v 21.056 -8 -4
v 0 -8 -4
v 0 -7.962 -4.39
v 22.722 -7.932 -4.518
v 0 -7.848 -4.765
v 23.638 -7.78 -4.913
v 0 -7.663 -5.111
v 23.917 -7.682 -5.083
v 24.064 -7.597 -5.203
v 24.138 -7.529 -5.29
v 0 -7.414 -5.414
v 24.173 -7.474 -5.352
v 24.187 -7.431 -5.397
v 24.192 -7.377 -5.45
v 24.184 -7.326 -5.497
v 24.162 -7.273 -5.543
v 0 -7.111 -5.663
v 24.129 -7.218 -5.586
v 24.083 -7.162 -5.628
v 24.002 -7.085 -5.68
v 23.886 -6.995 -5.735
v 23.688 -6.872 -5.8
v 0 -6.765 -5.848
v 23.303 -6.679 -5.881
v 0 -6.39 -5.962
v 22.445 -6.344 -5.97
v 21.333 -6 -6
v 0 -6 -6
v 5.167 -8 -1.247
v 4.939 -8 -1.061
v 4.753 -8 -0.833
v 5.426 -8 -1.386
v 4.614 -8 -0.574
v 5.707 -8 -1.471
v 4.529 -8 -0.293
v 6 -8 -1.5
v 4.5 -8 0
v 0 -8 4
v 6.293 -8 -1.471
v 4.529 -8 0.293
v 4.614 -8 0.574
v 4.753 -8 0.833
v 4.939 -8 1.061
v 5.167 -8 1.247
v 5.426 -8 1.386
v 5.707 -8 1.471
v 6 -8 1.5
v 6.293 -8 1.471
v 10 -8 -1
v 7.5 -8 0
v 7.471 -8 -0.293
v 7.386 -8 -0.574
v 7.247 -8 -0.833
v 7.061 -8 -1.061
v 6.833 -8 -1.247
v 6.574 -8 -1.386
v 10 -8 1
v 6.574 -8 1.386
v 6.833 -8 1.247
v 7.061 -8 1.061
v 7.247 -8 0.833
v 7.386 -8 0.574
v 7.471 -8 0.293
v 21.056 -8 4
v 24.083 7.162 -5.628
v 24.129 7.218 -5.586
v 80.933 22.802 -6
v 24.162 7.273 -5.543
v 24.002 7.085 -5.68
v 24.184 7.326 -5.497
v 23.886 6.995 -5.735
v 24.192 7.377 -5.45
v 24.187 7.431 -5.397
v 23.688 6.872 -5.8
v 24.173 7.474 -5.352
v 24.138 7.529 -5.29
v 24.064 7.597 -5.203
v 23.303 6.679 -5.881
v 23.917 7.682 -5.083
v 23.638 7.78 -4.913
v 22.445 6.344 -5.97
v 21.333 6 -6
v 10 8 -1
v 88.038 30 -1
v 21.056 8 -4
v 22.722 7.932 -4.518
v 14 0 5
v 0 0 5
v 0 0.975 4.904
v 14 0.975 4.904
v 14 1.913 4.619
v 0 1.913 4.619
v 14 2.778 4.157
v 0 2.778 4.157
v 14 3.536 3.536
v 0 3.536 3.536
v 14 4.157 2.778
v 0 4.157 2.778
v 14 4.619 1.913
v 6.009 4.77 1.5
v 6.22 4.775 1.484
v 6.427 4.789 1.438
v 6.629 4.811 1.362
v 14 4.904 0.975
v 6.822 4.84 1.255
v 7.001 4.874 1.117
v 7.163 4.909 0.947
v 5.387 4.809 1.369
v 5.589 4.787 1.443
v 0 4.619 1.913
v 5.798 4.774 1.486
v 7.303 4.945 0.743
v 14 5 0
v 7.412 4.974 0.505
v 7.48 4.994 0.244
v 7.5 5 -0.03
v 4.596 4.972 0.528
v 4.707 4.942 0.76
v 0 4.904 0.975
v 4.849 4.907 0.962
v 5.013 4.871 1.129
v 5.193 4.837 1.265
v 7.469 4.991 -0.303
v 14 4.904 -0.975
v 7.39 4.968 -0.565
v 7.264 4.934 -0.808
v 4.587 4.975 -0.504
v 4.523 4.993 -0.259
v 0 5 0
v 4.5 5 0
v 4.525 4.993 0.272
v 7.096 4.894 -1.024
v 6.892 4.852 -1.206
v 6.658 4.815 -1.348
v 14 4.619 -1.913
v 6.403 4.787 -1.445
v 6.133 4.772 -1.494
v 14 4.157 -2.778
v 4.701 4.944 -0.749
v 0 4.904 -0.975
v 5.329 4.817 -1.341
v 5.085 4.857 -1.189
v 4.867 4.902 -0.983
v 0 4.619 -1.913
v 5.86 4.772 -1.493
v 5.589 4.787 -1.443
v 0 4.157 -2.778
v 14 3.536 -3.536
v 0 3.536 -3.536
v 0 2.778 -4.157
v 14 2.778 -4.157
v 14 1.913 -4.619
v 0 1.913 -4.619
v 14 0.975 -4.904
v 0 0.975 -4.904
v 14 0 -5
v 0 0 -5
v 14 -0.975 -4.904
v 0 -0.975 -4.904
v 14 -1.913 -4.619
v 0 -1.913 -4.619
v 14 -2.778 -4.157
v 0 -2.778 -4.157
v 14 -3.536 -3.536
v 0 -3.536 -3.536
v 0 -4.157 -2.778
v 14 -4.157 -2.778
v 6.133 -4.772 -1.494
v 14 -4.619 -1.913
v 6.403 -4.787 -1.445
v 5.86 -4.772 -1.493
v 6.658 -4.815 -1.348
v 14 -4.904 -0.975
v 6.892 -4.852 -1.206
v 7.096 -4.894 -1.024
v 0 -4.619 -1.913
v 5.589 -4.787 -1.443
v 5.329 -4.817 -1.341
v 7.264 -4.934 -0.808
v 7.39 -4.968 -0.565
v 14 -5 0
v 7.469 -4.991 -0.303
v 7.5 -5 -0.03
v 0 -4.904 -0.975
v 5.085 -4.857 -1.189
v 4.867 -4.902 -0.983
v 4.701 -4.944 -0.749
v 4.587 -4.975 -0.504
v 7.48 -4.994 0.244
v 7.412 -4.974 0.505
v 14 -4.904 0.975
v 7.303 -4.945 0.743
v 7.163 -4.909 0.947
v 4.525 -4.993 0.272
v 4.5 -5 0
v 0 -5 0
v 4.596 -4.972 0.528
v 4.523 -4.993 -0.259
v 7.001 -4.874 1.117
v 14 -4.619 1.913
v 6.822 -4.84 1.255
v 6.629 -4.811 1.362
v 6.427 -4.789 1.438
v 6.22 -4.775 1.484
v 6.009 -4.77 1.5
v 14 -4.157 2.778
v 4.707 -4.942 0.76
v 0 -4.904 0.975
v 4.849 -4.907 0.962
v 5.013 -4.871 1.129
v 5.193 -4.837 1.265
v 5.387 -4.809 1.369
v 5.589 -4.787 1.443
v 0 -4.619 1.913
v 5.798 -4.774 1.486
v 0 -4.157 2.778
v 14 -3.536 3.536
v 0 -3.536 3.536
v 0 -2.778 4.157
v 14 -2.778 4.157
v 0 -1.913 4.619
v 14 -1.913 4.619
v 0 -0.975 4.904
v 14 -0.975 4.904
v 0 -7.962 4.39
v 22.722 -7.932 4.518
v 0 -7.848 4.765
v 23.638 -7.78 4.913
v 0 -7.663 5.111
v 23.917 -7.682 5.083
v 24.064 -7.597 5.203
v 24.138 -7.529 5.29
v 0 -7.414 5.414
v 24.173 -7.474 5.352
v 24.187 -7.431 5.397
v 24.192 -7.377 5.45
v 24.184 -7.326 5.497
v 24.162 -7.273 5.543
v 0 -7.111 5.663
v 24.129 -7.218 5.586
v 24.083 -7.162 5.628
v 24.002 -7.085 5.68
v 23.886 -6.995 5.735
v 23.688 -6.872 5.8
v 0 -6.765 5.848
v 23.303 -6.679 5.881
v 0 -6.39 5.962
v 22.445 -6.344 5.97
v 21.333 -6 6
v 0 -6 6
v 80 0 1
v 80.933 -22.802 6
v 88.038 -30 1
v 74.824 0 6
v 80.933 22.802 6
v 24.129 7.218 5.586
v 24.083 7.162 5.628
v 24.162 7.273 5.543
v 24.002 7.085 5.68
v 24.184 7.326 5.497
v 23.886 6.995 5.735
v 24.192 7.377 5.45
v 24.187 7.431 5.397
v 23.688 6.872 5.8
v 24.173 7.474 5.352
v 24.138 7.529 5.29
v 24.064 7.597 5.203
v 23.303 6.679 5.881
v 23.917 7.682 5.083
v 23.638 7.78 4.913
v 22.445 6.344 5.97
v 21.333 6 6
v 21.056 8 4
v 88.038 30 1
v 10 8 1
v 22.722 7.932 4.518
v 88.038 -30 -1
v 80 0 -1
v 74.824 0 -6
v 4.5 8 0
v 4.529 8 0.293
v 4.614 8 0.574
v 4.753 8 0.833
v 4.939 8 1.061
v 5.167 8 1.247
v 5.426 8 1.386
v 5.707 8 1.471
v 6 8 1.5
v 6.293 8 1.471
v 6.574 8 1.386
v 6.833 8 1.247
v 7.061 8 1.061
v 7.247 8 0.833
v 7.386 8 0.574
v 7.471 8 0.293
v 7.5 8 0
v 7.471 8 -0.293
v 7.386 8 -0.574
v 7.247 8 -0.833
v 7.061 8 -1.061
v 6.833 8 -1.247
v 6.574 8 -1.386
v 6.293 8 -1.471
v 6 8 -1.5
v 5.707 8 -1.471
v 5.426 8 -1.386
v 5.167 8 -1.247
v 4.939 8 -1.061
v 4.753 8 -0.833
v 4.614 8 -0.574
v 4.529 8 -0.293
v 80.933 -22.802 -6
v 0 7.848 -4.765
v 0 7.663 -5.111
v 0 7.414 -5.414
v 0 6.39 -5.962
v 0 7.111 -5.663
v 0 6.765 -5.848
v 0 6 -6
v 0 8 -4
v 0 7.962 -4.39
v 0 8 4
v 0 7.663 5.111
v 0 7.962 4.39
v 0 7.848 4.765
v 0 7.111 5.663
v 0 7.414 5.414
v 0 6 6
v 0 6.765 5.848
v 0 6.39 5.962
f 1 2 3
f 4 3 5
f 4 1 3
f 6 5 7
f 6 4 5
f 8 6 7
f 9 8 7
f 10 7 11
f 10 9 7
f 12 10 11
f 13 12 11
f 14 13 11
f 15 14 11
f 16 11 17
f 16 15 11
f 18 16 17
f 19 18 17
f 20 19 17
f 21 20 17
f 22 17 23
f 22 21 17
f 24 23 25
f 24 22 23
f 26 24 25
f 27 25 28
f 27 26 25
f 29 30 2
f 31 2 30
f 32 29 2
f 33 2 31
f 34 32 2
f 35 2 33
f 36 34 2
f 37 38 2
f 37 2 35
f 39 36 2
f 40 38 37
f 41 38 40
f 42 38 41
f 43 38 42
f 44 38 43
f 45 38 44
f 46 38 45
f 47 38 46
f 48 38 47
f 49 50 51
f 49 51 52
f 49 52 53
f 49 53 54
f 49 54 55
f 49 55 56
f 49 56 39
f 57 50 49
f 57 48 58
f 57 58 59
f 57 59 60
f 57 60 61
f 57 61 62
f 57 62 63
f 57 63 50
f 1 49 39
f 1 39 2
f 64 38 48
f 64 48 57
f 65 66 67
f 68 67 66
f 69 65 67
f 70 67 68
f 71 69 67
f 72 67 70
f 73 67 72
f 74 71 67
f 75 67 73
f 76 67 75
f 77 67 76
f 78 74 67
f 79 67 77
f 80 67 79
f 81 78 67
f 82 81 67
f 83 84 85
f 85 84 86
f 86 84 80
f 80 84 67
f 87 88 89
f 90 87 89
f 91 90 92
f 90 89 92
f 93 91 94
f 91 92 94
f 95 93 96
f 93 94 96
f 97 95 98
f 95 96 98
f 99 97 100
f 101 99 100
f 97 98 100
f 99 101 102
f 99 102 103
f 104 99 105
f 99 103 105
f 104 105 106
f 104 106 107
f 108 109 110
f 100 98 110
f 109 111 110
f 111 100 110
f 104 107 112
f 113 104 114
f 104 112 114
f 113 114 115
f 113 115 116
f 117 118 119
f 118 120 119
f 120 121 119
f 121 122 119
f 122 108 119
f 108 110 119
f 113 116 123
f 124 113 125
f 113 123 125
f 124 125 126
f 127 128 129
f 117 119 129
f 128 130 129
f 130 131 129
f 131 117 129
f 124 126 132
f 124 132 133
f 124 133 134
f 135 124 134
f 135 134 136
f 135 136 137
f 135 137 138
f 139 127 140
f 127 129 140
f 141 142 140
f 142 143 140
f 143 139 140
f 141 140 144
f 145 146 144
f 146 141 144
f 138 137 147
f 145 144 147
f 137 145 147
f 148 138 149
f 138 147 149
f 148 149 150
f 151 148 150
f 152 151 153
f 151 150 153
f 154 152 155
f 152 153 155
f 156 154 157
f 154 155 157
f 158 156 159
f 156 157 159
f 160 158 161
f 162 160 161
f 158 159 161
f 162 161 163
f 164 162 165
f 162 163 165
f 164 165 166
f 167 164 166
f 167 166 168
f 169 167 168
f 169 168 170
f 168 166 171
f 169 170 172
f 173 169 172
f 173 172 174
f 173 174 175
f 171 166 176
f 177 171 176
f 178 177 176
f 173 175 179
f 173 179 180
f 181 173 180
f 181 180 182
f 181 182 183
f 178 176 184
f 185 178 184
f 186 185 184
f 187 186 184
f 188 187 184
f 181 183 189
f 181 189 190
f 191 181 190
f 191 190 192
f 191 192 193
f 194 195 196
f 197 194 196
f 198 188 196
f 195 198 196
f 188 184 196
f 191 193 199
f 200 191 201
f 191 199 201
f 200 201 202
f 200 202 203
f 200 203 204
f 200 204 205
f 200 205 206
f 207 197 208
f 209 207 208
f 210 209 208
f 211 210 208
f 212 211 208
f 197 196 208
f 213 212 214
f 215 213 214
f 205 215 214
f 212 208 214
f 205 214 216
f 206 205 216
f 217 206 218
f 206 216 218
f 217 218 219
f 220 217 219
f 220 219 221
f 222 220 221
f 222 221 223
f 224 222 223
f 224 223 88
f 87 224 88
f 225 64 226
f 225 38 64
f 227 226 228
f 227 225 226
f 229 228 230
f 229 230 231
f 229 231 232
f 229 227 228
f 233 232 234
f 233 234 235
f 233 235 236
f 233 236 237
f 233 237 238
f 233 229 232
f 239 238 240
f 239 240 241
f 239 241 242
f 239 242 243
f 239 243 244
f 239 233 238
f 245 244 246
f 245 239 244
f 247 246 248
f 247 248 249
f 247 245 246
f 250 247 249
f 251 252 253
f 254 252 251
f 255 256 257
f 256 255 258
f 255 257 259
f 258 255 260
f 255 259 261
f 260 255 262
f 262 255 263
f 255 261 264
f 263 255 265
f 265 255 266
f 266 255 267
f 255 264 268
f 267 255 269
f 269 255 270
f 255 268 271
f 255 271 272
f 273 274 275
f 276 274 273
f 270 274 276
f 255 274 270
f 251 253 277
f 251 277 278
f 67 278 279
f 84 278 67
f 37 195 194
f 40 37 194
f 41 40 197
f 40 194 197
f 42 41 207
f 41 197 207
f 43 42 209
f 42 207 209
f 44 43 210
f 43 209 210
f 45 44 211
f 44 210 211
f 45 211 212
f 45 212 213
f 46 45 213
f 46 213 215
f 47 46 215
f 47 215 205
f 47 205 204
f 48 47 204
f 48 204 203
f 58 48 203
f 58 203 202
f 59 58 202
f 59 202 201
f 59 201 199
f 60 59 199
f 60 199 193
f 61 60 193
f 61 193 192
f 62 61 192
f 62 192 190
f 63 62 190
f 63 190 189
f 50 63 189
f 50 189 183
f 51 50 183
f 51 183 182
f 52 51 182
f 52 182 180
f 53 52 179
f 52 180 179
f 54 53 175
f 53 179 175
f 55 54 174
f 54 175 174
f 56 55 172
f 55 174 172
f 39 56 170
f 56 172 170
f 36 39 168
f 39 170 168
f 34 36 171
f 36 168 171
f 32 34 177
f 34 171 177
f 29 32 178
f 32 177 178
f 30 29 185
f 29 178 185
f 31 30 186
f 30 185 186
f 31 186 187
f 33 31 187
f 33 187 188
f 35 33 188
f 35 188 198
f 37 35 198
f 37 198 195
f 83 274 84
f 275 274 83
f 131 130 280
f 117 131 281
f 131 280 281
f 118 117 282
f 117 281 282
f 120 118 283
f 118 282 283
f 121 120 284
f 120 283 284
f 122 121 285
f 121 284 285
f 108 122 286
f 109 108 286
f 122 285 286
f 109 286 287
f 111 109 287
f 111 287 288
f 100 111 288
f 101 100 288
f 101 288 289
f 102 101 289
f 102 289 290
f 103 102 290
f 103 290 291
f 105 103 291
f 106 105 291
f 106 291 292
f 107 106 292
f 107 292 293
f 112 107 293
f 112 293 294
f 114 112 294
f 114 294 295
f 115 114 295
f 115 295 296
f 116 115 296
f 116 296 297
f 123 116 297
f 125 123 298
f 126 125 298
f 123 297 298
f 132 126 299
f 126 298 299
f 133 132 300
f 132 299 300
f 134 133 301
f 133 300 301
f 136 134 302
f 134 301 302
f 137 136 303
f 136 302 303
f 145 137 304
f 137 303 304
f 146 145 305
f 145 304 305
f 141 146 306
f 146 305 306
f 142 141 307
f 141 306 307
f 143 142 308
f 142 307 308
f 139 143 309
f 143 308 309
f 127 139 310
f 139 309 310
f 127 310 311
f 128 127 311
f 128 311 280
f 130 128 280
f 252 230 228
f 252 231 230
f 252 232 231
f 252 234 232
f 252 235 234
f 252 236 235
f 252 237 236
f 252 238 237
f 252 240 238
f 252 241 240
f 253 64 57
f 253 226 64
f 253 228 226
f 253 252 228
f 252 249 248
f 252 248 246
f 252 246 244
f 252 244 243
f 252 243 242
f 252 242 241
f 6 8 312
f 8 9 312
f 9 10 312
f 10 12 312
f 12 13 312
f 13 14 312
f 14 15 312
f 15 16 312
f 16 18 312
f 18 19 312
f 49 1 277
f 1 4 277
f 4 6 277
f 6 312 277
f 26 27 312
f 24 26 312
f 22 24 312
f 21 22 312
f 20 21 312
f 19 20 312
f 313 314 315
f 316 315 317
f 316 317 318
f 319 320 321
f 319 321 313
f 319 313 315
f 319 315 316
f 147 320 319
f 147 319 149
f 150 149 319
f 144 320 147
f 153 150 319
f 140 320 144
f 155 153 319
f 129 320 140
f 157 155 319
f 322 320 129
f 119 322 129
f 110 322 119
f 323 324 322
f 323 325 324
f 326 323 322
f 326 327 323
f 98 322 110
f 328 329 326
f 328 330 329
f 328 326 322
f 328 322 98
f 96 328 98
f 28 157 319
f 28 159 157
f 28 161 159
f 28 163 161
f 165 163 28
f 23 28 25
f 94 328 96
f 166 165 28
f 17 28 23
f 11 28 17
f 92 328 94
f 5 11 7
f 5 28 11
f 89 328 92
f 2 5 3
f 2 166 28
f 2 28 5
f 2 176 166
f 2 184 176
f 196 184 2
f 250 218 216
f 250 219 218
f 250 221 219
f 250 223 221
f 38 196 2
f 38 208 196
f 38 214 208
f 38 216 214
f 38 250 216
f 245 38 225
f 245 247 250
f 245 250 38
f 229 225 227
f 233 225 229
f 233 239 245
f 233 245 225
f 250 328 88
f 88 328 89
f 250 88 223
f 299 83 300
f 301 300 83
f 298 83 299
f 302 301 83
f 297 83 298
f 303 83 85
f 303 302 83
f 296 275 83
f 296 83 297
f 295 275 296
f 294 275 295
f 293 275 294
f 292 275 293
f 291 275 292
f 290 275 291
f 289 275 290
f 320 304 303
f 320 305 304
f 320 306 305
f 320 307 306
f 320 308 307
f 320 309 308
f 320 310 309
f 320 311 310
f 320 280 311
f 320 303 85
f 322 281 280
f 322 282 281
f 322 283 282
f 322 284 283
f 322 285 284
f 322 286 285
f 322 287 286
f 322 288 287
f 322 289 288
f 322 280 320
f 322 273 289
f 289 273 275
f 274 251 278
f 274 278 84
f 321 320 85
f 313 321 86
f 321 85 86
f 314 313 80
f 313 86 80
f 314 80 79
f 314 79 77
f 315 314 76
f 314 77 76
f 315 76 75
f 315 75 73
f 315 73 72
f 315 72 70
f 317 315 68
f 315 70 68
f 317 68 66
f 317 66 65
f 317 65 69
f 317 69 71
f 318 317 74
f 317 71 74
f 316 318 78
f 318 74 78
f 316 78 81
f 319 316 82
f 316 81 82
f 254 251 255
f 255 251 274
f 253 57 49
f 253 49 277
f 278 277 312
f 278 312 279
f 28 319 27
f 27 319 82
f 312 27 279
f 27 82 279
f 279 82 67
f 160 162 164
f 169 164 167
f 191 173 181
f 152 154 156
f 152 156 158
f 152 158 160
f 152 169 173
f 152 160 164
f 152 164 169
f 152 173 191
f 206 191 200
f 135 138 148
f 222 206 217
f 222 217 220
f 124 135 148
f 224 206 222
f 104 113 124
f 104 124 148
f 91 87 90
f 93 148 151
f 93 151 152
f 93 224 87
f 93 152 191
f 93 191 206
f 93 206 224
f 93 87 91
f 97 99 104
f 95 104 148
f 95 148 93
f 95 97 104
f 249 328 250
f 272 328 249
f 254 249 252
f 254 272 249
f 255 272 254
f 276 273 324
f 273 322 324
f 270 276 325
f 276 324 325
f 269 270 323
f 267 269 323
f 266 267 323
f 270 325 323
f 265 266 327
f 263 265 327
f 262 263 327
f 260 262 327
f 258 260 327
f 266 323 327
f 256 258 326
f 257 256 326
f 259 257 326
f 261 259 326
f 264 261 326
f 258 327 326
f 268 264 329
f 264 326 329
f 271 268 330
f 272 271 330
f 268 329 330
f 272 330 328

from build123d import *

# Parameters (mm, degrees)
BOSS_EXTRUDE8_DEPTH = 6
SKETCH7_R           = 5
CUT_EXTRUDE3_DEPTH  = 14
SKETCH8_R           = 1.5
CUT_EXTRUDE4_DEPTH  = 97.076913025
CHAMFER3_SIZE       = 5
FILLET4_R           = 2


with BuildPart() as part:
    # Sketch1 → Boss-Extrude8 (new, symmetric)
    with BuildSketch(Plane.XY):
        Polygon((10, -8), (88.038475773, -30), (80, 0), (88.038475773, 30), (10, 8), (0, 8), (0, -8), align=None)
    extrude(amount=BOSS_EXTRUDE8_DEPTH, both=True)

    # Sketch7 → Cut-Extrude3 (cut)
    with BuildSketch(Plane.ZY):
        Circle(SKETCH7_R)
    extrude(amount=-CUT_EXTRUDE3_DEPTH, mode=Mode.SUBTRACT)

    # Sketch8 → Cut-Extrude4 (cut, through all)
    with BuildSketch(Plane(origin=(0, 8, 0), x_dir=(1, 0, 0), z_dir=(0, 1, 0))):
        with Locations(Location((6, 0, 0), (0, 0, 180))):
            Circle(SKETCH8_R)
    extrude(amount=-CUT_EXTRUDE4_DEPTH, mode=Mode.SUBTRACT)

    # Chamfer3
    chamfer3_edges = [part.edges().sort_by_distance(p)[0] for p in [
        (49.019237886, -19, 6),
        (84.019237886, -15, 6),
        (84.019237886, 15, 6),
        (49.019237886, 19, 6),
        (49.019237886, 19, -6),
        (84.019237886, 15, -6),
        (84.019237886, -15, -6),
        (49.019237886, -19, -6),
    ]]
    chamfer(chamfer3_edges, length=CHAMFER3_SIZE)

    # Fillet4
    fillet4_edges = [part.edges().sort_by_distance(p)[0] for p in [
        (14.213662503, -8, 6),
        (14.213662503, 8, 6),
        (14.213662503, -8, -6),
        (14.213662503, 8, -6),
    ]]
    fillet(fillet4_edges, radius=FILLET4_R)


solid = part.part
